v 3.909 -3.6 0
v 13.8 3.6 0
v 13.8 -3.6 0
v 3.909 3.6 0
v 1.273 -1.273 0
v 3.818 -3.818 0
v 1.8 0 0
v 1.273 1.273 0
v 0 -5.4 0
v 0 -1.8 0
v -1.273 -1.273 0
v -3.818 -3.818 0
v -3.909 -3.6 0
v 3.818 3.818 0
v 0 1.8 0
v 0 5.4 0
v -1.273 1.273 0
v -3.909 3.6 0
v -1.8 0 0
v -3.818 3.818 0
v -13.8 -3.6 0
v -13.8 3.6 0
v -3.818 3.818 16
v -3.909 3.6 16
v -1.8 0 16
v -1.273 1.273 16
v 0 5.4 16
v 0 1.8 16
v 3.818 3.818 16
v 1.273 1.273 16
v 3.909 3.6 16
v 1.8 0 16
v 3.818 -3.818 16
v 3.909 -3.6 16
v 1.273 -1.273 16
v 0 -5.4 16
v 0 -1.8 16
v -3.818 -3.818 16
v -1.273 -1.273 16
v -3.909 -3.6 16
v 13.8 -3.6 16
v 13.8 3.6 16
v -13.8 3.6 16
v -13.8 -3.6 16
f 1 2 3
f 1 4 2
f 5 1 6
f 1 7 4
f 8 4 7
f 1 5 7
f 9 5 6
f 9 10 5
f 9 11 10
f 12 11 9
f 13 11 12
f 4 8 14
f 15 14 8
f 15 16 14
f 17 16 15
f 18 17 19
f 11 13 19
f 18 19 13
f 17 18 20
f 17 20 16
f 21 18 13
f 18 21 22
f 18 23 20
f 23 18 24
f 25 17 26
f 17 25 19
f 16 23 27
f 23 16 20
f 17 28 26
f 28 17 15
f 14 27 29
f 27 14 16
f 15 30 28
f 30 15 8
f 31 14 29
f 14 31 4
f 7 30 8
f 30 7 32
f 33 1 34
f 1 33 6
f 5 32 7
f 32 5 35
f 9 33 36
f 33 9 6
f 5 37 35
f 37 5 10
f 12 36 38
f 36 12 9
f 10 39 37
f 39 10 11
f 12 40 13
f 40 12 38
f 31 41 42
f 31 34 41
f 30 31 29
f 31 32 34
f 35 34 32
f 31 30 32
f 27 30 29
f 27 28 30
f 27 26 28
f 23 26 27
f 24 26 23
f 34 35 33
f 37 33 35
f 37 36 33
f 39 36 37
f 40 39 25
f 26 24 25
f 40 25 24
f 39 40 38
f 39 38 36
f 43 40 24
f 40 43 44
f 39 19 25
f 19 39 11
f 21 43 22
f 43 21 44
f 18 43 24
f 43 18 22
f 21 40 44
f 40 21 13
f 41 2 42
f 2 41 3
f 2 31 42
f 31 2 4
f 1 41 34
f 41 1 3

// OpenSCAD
//print time on the 20mm risers was /insane/ so I'm going for something simpler
//that's right, M3 washers

//sized for M3 screws
screw = 3.6; //.6 for slop
// a 5015 blower fan is, as you might expect, 15mm thick
height = 16; 
//length of wings (measured from center)
wing = 12;
//number of wings
sides = 2; //[0,1,2]
$fn = 1*8;

union(){
    rotate_extrude(angle=360)
    translate ([0.5*screw, 0])
    square ([screw, height]);
    
    if (sides > 1){
        translate ([-(0.5*screw)-wing, -screw, 0])
        cube ([wing, 2*screw, height]);
    }
    
    if (sides > 0){
        translate ([0.5*screw, -screw, 0])
        cube ([wing, 2*screw, height]);
    }
}
